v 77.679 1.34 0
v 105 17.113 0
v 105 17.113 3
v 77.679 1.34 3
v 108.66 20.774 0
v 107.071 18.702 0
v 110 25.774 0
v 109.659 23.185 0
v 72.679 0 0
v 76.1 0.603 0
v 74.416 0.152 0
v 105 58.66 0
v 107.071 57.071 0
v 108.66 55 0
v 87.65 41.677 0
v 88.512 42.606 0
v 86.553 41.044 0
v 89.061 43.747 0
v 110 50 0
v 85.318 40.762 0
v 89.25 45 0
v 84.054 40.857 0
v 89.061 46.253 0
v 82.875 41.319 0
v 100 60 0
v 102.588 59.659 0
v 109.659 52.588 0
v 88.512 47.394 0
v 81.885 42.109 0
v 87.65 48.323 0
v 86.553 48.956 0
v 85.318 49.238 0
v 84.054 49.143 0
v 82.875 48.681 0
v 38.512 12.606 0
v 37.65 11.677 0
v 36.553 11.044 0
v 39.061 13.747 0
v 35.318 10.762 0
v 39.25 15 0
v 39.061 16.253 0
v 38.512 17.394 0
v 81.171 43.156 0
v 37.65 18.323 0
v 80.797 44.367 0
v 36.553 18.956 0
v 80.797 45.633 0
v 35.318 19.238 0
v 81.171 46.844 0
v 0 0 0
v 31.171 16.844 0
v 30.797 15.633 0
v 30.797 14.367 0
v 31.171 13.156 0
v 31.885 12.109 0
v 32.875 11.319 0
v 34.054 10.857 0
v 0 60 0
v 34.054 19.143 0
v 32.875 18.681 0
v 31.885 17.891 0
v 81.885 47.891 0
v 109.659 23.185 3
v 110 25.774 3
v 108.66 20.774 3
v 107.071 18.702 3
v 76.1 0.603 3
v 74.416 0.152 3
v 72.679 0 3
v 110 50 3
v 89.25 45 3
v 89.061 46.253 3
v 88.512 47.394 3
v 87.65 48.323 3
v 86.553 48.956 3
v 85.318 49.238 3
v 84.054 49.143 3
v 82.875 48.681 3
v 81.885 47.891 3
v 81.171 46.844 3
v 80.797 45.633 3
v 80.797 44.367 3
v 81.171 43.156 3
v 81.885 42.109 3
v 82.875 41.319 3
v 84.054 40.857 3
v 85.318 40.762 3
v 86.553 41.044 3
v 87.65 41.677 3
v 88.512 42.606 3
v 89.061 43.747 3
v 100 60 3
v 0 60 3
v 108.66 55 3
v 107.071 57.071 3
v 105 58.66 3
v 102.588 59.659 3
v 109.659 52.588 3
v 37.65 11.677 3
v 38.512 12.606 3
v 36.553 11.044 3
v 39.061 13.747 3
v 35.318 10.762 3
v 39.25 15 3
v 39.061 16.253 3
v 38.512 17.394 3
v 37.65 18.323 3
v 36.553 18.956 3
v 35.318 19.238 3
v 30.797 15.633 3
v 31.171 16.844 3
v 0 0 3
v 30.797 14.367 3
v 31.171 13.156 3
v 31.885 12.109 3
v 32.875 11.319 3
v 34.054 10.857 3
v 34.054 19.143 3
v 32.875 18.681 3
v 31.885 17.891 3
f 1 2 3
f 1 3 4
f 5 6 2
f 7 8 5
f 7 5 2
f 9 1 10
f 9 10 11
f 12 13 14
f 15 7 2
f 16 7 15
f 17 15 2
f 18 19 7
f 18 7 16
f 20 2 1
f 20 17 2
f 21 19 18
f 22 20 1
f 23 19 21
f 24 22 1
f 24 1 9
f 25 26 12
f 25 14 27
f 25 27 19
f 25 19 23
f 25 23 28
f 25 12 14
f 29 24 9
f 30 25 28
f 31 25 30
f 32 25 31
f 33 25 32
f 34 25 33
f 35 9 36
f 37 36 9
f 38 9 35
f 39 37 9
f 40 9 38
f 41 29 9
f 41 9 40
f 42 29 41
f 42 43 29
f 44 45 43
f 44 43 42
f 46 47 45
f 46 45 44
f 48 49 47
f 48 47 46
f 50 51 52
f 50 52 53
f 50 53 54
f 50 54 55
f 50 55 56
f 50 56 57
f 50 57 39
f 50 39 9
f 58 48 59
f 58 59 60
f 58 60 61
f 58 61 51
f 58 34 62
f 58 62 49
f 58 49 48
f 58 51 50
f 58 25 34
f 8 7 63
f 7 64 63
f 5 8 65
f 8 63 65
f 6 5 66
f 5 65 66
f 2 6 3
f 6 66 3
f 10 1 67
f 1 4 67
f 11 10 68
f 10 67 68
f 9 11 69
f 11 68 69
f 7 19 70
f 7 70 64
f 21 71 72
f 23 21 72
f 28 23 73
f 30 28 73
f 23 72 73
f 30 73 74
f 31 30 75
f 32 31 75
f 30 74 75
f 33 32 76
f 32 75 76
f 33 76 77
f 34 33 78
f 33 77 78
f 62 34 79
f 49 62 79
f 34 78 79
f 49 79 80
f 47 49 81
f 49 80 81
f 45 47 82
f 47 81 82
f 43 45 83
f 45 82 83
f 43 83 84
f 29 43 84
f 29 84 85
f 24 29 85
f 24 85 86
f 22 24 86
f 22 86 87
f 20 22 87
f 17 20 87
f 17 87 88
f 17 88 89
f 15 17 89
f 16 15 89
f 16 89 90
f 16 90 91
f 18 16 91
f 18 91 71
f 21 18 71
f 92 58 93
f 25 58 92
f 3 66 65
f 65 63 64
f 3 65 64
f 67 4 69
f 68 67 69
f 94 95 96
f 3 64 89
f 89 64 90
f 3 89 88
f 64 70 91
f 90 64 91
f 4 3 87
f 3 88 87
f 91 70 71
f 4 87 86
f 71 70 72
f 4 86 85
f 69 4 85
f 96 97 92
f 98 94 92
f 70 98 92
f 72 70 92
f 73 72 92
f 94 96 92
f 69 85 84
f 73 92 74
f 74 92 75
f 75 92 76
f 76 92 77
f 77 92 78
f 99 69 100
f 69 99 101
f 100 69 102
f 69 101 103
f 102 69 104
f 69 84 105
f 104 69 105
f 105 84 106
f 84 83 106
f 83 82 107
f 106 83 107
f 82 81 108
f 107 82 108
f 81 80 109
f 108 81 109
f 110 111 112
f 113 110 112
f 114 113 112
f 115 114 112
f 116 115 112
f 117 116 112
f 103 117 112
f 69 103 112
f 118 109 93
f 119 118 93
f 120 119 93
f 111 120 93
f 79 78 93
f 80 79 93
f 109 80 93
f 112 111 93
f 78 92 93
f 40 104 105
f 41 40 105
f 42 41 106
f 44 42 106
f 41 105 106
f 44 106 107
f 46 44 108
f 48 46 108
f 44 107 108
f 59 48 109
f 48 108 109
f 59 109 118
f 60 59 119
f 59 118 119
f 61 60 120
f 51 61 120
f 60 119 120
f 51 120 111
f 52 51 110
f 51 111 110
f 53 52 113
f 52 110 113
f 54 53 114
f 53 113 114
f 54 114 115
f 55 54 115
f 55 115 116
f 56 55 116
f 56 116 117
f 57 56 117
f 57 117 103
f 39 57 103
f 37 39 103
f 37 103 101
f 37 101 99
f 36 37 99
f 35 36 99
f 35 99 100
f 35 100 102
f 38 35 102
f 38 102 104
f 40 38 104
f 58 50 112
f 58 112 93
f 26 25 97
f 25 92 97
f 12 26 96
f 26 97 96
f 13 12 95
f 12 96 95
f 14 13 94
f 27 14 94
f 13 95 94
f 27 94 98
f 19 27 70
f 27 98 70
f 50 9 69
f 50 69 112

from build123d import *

# Parameters (mm, degrees)
BOSS_EXTRUDE1_DEPTH = 3
FILLET1_R           = 10
SKETCH2_R           = 4.25
CUT_EXTRUDE1_DEPTH  = 126.335549626


with BuildPart() as part:
    # Sketch1 → Boss-Extrude1 (new body)
    with BuildSketch(Plane.XY):
        Polygon((0, 0), (0, 60), (110, 60), (110, 20), (75.358983849, 0), align=None)
    extrude(amount=BOSS_EXTRUDE1_DEPTH)

    # Fillet1
    fillet1_edges = [part.edges().sort_by_distance(p)[0] for p in [
        (110, 60, 1.5),
        (110, 20, 1.5),
        (75.358983849, 0, 1.5),
    ]]
    fillet(fillet1_edges, radius=FILLET1_R)

    # Sketch2 → Cut-Extrude1 (cut, through all)
    with BuildSketch(Plane.XY.offset(3)):
        with Locations((35, 15)):
            Circle(SKETCH2_R)
        with Locations((85, 45)):
            Circle(SKETCH2_R)
    extrude(amount=-CUT_EXTRUDE1_DEPTH, mode=Mode.SUBTRACT)


solid = part.part
